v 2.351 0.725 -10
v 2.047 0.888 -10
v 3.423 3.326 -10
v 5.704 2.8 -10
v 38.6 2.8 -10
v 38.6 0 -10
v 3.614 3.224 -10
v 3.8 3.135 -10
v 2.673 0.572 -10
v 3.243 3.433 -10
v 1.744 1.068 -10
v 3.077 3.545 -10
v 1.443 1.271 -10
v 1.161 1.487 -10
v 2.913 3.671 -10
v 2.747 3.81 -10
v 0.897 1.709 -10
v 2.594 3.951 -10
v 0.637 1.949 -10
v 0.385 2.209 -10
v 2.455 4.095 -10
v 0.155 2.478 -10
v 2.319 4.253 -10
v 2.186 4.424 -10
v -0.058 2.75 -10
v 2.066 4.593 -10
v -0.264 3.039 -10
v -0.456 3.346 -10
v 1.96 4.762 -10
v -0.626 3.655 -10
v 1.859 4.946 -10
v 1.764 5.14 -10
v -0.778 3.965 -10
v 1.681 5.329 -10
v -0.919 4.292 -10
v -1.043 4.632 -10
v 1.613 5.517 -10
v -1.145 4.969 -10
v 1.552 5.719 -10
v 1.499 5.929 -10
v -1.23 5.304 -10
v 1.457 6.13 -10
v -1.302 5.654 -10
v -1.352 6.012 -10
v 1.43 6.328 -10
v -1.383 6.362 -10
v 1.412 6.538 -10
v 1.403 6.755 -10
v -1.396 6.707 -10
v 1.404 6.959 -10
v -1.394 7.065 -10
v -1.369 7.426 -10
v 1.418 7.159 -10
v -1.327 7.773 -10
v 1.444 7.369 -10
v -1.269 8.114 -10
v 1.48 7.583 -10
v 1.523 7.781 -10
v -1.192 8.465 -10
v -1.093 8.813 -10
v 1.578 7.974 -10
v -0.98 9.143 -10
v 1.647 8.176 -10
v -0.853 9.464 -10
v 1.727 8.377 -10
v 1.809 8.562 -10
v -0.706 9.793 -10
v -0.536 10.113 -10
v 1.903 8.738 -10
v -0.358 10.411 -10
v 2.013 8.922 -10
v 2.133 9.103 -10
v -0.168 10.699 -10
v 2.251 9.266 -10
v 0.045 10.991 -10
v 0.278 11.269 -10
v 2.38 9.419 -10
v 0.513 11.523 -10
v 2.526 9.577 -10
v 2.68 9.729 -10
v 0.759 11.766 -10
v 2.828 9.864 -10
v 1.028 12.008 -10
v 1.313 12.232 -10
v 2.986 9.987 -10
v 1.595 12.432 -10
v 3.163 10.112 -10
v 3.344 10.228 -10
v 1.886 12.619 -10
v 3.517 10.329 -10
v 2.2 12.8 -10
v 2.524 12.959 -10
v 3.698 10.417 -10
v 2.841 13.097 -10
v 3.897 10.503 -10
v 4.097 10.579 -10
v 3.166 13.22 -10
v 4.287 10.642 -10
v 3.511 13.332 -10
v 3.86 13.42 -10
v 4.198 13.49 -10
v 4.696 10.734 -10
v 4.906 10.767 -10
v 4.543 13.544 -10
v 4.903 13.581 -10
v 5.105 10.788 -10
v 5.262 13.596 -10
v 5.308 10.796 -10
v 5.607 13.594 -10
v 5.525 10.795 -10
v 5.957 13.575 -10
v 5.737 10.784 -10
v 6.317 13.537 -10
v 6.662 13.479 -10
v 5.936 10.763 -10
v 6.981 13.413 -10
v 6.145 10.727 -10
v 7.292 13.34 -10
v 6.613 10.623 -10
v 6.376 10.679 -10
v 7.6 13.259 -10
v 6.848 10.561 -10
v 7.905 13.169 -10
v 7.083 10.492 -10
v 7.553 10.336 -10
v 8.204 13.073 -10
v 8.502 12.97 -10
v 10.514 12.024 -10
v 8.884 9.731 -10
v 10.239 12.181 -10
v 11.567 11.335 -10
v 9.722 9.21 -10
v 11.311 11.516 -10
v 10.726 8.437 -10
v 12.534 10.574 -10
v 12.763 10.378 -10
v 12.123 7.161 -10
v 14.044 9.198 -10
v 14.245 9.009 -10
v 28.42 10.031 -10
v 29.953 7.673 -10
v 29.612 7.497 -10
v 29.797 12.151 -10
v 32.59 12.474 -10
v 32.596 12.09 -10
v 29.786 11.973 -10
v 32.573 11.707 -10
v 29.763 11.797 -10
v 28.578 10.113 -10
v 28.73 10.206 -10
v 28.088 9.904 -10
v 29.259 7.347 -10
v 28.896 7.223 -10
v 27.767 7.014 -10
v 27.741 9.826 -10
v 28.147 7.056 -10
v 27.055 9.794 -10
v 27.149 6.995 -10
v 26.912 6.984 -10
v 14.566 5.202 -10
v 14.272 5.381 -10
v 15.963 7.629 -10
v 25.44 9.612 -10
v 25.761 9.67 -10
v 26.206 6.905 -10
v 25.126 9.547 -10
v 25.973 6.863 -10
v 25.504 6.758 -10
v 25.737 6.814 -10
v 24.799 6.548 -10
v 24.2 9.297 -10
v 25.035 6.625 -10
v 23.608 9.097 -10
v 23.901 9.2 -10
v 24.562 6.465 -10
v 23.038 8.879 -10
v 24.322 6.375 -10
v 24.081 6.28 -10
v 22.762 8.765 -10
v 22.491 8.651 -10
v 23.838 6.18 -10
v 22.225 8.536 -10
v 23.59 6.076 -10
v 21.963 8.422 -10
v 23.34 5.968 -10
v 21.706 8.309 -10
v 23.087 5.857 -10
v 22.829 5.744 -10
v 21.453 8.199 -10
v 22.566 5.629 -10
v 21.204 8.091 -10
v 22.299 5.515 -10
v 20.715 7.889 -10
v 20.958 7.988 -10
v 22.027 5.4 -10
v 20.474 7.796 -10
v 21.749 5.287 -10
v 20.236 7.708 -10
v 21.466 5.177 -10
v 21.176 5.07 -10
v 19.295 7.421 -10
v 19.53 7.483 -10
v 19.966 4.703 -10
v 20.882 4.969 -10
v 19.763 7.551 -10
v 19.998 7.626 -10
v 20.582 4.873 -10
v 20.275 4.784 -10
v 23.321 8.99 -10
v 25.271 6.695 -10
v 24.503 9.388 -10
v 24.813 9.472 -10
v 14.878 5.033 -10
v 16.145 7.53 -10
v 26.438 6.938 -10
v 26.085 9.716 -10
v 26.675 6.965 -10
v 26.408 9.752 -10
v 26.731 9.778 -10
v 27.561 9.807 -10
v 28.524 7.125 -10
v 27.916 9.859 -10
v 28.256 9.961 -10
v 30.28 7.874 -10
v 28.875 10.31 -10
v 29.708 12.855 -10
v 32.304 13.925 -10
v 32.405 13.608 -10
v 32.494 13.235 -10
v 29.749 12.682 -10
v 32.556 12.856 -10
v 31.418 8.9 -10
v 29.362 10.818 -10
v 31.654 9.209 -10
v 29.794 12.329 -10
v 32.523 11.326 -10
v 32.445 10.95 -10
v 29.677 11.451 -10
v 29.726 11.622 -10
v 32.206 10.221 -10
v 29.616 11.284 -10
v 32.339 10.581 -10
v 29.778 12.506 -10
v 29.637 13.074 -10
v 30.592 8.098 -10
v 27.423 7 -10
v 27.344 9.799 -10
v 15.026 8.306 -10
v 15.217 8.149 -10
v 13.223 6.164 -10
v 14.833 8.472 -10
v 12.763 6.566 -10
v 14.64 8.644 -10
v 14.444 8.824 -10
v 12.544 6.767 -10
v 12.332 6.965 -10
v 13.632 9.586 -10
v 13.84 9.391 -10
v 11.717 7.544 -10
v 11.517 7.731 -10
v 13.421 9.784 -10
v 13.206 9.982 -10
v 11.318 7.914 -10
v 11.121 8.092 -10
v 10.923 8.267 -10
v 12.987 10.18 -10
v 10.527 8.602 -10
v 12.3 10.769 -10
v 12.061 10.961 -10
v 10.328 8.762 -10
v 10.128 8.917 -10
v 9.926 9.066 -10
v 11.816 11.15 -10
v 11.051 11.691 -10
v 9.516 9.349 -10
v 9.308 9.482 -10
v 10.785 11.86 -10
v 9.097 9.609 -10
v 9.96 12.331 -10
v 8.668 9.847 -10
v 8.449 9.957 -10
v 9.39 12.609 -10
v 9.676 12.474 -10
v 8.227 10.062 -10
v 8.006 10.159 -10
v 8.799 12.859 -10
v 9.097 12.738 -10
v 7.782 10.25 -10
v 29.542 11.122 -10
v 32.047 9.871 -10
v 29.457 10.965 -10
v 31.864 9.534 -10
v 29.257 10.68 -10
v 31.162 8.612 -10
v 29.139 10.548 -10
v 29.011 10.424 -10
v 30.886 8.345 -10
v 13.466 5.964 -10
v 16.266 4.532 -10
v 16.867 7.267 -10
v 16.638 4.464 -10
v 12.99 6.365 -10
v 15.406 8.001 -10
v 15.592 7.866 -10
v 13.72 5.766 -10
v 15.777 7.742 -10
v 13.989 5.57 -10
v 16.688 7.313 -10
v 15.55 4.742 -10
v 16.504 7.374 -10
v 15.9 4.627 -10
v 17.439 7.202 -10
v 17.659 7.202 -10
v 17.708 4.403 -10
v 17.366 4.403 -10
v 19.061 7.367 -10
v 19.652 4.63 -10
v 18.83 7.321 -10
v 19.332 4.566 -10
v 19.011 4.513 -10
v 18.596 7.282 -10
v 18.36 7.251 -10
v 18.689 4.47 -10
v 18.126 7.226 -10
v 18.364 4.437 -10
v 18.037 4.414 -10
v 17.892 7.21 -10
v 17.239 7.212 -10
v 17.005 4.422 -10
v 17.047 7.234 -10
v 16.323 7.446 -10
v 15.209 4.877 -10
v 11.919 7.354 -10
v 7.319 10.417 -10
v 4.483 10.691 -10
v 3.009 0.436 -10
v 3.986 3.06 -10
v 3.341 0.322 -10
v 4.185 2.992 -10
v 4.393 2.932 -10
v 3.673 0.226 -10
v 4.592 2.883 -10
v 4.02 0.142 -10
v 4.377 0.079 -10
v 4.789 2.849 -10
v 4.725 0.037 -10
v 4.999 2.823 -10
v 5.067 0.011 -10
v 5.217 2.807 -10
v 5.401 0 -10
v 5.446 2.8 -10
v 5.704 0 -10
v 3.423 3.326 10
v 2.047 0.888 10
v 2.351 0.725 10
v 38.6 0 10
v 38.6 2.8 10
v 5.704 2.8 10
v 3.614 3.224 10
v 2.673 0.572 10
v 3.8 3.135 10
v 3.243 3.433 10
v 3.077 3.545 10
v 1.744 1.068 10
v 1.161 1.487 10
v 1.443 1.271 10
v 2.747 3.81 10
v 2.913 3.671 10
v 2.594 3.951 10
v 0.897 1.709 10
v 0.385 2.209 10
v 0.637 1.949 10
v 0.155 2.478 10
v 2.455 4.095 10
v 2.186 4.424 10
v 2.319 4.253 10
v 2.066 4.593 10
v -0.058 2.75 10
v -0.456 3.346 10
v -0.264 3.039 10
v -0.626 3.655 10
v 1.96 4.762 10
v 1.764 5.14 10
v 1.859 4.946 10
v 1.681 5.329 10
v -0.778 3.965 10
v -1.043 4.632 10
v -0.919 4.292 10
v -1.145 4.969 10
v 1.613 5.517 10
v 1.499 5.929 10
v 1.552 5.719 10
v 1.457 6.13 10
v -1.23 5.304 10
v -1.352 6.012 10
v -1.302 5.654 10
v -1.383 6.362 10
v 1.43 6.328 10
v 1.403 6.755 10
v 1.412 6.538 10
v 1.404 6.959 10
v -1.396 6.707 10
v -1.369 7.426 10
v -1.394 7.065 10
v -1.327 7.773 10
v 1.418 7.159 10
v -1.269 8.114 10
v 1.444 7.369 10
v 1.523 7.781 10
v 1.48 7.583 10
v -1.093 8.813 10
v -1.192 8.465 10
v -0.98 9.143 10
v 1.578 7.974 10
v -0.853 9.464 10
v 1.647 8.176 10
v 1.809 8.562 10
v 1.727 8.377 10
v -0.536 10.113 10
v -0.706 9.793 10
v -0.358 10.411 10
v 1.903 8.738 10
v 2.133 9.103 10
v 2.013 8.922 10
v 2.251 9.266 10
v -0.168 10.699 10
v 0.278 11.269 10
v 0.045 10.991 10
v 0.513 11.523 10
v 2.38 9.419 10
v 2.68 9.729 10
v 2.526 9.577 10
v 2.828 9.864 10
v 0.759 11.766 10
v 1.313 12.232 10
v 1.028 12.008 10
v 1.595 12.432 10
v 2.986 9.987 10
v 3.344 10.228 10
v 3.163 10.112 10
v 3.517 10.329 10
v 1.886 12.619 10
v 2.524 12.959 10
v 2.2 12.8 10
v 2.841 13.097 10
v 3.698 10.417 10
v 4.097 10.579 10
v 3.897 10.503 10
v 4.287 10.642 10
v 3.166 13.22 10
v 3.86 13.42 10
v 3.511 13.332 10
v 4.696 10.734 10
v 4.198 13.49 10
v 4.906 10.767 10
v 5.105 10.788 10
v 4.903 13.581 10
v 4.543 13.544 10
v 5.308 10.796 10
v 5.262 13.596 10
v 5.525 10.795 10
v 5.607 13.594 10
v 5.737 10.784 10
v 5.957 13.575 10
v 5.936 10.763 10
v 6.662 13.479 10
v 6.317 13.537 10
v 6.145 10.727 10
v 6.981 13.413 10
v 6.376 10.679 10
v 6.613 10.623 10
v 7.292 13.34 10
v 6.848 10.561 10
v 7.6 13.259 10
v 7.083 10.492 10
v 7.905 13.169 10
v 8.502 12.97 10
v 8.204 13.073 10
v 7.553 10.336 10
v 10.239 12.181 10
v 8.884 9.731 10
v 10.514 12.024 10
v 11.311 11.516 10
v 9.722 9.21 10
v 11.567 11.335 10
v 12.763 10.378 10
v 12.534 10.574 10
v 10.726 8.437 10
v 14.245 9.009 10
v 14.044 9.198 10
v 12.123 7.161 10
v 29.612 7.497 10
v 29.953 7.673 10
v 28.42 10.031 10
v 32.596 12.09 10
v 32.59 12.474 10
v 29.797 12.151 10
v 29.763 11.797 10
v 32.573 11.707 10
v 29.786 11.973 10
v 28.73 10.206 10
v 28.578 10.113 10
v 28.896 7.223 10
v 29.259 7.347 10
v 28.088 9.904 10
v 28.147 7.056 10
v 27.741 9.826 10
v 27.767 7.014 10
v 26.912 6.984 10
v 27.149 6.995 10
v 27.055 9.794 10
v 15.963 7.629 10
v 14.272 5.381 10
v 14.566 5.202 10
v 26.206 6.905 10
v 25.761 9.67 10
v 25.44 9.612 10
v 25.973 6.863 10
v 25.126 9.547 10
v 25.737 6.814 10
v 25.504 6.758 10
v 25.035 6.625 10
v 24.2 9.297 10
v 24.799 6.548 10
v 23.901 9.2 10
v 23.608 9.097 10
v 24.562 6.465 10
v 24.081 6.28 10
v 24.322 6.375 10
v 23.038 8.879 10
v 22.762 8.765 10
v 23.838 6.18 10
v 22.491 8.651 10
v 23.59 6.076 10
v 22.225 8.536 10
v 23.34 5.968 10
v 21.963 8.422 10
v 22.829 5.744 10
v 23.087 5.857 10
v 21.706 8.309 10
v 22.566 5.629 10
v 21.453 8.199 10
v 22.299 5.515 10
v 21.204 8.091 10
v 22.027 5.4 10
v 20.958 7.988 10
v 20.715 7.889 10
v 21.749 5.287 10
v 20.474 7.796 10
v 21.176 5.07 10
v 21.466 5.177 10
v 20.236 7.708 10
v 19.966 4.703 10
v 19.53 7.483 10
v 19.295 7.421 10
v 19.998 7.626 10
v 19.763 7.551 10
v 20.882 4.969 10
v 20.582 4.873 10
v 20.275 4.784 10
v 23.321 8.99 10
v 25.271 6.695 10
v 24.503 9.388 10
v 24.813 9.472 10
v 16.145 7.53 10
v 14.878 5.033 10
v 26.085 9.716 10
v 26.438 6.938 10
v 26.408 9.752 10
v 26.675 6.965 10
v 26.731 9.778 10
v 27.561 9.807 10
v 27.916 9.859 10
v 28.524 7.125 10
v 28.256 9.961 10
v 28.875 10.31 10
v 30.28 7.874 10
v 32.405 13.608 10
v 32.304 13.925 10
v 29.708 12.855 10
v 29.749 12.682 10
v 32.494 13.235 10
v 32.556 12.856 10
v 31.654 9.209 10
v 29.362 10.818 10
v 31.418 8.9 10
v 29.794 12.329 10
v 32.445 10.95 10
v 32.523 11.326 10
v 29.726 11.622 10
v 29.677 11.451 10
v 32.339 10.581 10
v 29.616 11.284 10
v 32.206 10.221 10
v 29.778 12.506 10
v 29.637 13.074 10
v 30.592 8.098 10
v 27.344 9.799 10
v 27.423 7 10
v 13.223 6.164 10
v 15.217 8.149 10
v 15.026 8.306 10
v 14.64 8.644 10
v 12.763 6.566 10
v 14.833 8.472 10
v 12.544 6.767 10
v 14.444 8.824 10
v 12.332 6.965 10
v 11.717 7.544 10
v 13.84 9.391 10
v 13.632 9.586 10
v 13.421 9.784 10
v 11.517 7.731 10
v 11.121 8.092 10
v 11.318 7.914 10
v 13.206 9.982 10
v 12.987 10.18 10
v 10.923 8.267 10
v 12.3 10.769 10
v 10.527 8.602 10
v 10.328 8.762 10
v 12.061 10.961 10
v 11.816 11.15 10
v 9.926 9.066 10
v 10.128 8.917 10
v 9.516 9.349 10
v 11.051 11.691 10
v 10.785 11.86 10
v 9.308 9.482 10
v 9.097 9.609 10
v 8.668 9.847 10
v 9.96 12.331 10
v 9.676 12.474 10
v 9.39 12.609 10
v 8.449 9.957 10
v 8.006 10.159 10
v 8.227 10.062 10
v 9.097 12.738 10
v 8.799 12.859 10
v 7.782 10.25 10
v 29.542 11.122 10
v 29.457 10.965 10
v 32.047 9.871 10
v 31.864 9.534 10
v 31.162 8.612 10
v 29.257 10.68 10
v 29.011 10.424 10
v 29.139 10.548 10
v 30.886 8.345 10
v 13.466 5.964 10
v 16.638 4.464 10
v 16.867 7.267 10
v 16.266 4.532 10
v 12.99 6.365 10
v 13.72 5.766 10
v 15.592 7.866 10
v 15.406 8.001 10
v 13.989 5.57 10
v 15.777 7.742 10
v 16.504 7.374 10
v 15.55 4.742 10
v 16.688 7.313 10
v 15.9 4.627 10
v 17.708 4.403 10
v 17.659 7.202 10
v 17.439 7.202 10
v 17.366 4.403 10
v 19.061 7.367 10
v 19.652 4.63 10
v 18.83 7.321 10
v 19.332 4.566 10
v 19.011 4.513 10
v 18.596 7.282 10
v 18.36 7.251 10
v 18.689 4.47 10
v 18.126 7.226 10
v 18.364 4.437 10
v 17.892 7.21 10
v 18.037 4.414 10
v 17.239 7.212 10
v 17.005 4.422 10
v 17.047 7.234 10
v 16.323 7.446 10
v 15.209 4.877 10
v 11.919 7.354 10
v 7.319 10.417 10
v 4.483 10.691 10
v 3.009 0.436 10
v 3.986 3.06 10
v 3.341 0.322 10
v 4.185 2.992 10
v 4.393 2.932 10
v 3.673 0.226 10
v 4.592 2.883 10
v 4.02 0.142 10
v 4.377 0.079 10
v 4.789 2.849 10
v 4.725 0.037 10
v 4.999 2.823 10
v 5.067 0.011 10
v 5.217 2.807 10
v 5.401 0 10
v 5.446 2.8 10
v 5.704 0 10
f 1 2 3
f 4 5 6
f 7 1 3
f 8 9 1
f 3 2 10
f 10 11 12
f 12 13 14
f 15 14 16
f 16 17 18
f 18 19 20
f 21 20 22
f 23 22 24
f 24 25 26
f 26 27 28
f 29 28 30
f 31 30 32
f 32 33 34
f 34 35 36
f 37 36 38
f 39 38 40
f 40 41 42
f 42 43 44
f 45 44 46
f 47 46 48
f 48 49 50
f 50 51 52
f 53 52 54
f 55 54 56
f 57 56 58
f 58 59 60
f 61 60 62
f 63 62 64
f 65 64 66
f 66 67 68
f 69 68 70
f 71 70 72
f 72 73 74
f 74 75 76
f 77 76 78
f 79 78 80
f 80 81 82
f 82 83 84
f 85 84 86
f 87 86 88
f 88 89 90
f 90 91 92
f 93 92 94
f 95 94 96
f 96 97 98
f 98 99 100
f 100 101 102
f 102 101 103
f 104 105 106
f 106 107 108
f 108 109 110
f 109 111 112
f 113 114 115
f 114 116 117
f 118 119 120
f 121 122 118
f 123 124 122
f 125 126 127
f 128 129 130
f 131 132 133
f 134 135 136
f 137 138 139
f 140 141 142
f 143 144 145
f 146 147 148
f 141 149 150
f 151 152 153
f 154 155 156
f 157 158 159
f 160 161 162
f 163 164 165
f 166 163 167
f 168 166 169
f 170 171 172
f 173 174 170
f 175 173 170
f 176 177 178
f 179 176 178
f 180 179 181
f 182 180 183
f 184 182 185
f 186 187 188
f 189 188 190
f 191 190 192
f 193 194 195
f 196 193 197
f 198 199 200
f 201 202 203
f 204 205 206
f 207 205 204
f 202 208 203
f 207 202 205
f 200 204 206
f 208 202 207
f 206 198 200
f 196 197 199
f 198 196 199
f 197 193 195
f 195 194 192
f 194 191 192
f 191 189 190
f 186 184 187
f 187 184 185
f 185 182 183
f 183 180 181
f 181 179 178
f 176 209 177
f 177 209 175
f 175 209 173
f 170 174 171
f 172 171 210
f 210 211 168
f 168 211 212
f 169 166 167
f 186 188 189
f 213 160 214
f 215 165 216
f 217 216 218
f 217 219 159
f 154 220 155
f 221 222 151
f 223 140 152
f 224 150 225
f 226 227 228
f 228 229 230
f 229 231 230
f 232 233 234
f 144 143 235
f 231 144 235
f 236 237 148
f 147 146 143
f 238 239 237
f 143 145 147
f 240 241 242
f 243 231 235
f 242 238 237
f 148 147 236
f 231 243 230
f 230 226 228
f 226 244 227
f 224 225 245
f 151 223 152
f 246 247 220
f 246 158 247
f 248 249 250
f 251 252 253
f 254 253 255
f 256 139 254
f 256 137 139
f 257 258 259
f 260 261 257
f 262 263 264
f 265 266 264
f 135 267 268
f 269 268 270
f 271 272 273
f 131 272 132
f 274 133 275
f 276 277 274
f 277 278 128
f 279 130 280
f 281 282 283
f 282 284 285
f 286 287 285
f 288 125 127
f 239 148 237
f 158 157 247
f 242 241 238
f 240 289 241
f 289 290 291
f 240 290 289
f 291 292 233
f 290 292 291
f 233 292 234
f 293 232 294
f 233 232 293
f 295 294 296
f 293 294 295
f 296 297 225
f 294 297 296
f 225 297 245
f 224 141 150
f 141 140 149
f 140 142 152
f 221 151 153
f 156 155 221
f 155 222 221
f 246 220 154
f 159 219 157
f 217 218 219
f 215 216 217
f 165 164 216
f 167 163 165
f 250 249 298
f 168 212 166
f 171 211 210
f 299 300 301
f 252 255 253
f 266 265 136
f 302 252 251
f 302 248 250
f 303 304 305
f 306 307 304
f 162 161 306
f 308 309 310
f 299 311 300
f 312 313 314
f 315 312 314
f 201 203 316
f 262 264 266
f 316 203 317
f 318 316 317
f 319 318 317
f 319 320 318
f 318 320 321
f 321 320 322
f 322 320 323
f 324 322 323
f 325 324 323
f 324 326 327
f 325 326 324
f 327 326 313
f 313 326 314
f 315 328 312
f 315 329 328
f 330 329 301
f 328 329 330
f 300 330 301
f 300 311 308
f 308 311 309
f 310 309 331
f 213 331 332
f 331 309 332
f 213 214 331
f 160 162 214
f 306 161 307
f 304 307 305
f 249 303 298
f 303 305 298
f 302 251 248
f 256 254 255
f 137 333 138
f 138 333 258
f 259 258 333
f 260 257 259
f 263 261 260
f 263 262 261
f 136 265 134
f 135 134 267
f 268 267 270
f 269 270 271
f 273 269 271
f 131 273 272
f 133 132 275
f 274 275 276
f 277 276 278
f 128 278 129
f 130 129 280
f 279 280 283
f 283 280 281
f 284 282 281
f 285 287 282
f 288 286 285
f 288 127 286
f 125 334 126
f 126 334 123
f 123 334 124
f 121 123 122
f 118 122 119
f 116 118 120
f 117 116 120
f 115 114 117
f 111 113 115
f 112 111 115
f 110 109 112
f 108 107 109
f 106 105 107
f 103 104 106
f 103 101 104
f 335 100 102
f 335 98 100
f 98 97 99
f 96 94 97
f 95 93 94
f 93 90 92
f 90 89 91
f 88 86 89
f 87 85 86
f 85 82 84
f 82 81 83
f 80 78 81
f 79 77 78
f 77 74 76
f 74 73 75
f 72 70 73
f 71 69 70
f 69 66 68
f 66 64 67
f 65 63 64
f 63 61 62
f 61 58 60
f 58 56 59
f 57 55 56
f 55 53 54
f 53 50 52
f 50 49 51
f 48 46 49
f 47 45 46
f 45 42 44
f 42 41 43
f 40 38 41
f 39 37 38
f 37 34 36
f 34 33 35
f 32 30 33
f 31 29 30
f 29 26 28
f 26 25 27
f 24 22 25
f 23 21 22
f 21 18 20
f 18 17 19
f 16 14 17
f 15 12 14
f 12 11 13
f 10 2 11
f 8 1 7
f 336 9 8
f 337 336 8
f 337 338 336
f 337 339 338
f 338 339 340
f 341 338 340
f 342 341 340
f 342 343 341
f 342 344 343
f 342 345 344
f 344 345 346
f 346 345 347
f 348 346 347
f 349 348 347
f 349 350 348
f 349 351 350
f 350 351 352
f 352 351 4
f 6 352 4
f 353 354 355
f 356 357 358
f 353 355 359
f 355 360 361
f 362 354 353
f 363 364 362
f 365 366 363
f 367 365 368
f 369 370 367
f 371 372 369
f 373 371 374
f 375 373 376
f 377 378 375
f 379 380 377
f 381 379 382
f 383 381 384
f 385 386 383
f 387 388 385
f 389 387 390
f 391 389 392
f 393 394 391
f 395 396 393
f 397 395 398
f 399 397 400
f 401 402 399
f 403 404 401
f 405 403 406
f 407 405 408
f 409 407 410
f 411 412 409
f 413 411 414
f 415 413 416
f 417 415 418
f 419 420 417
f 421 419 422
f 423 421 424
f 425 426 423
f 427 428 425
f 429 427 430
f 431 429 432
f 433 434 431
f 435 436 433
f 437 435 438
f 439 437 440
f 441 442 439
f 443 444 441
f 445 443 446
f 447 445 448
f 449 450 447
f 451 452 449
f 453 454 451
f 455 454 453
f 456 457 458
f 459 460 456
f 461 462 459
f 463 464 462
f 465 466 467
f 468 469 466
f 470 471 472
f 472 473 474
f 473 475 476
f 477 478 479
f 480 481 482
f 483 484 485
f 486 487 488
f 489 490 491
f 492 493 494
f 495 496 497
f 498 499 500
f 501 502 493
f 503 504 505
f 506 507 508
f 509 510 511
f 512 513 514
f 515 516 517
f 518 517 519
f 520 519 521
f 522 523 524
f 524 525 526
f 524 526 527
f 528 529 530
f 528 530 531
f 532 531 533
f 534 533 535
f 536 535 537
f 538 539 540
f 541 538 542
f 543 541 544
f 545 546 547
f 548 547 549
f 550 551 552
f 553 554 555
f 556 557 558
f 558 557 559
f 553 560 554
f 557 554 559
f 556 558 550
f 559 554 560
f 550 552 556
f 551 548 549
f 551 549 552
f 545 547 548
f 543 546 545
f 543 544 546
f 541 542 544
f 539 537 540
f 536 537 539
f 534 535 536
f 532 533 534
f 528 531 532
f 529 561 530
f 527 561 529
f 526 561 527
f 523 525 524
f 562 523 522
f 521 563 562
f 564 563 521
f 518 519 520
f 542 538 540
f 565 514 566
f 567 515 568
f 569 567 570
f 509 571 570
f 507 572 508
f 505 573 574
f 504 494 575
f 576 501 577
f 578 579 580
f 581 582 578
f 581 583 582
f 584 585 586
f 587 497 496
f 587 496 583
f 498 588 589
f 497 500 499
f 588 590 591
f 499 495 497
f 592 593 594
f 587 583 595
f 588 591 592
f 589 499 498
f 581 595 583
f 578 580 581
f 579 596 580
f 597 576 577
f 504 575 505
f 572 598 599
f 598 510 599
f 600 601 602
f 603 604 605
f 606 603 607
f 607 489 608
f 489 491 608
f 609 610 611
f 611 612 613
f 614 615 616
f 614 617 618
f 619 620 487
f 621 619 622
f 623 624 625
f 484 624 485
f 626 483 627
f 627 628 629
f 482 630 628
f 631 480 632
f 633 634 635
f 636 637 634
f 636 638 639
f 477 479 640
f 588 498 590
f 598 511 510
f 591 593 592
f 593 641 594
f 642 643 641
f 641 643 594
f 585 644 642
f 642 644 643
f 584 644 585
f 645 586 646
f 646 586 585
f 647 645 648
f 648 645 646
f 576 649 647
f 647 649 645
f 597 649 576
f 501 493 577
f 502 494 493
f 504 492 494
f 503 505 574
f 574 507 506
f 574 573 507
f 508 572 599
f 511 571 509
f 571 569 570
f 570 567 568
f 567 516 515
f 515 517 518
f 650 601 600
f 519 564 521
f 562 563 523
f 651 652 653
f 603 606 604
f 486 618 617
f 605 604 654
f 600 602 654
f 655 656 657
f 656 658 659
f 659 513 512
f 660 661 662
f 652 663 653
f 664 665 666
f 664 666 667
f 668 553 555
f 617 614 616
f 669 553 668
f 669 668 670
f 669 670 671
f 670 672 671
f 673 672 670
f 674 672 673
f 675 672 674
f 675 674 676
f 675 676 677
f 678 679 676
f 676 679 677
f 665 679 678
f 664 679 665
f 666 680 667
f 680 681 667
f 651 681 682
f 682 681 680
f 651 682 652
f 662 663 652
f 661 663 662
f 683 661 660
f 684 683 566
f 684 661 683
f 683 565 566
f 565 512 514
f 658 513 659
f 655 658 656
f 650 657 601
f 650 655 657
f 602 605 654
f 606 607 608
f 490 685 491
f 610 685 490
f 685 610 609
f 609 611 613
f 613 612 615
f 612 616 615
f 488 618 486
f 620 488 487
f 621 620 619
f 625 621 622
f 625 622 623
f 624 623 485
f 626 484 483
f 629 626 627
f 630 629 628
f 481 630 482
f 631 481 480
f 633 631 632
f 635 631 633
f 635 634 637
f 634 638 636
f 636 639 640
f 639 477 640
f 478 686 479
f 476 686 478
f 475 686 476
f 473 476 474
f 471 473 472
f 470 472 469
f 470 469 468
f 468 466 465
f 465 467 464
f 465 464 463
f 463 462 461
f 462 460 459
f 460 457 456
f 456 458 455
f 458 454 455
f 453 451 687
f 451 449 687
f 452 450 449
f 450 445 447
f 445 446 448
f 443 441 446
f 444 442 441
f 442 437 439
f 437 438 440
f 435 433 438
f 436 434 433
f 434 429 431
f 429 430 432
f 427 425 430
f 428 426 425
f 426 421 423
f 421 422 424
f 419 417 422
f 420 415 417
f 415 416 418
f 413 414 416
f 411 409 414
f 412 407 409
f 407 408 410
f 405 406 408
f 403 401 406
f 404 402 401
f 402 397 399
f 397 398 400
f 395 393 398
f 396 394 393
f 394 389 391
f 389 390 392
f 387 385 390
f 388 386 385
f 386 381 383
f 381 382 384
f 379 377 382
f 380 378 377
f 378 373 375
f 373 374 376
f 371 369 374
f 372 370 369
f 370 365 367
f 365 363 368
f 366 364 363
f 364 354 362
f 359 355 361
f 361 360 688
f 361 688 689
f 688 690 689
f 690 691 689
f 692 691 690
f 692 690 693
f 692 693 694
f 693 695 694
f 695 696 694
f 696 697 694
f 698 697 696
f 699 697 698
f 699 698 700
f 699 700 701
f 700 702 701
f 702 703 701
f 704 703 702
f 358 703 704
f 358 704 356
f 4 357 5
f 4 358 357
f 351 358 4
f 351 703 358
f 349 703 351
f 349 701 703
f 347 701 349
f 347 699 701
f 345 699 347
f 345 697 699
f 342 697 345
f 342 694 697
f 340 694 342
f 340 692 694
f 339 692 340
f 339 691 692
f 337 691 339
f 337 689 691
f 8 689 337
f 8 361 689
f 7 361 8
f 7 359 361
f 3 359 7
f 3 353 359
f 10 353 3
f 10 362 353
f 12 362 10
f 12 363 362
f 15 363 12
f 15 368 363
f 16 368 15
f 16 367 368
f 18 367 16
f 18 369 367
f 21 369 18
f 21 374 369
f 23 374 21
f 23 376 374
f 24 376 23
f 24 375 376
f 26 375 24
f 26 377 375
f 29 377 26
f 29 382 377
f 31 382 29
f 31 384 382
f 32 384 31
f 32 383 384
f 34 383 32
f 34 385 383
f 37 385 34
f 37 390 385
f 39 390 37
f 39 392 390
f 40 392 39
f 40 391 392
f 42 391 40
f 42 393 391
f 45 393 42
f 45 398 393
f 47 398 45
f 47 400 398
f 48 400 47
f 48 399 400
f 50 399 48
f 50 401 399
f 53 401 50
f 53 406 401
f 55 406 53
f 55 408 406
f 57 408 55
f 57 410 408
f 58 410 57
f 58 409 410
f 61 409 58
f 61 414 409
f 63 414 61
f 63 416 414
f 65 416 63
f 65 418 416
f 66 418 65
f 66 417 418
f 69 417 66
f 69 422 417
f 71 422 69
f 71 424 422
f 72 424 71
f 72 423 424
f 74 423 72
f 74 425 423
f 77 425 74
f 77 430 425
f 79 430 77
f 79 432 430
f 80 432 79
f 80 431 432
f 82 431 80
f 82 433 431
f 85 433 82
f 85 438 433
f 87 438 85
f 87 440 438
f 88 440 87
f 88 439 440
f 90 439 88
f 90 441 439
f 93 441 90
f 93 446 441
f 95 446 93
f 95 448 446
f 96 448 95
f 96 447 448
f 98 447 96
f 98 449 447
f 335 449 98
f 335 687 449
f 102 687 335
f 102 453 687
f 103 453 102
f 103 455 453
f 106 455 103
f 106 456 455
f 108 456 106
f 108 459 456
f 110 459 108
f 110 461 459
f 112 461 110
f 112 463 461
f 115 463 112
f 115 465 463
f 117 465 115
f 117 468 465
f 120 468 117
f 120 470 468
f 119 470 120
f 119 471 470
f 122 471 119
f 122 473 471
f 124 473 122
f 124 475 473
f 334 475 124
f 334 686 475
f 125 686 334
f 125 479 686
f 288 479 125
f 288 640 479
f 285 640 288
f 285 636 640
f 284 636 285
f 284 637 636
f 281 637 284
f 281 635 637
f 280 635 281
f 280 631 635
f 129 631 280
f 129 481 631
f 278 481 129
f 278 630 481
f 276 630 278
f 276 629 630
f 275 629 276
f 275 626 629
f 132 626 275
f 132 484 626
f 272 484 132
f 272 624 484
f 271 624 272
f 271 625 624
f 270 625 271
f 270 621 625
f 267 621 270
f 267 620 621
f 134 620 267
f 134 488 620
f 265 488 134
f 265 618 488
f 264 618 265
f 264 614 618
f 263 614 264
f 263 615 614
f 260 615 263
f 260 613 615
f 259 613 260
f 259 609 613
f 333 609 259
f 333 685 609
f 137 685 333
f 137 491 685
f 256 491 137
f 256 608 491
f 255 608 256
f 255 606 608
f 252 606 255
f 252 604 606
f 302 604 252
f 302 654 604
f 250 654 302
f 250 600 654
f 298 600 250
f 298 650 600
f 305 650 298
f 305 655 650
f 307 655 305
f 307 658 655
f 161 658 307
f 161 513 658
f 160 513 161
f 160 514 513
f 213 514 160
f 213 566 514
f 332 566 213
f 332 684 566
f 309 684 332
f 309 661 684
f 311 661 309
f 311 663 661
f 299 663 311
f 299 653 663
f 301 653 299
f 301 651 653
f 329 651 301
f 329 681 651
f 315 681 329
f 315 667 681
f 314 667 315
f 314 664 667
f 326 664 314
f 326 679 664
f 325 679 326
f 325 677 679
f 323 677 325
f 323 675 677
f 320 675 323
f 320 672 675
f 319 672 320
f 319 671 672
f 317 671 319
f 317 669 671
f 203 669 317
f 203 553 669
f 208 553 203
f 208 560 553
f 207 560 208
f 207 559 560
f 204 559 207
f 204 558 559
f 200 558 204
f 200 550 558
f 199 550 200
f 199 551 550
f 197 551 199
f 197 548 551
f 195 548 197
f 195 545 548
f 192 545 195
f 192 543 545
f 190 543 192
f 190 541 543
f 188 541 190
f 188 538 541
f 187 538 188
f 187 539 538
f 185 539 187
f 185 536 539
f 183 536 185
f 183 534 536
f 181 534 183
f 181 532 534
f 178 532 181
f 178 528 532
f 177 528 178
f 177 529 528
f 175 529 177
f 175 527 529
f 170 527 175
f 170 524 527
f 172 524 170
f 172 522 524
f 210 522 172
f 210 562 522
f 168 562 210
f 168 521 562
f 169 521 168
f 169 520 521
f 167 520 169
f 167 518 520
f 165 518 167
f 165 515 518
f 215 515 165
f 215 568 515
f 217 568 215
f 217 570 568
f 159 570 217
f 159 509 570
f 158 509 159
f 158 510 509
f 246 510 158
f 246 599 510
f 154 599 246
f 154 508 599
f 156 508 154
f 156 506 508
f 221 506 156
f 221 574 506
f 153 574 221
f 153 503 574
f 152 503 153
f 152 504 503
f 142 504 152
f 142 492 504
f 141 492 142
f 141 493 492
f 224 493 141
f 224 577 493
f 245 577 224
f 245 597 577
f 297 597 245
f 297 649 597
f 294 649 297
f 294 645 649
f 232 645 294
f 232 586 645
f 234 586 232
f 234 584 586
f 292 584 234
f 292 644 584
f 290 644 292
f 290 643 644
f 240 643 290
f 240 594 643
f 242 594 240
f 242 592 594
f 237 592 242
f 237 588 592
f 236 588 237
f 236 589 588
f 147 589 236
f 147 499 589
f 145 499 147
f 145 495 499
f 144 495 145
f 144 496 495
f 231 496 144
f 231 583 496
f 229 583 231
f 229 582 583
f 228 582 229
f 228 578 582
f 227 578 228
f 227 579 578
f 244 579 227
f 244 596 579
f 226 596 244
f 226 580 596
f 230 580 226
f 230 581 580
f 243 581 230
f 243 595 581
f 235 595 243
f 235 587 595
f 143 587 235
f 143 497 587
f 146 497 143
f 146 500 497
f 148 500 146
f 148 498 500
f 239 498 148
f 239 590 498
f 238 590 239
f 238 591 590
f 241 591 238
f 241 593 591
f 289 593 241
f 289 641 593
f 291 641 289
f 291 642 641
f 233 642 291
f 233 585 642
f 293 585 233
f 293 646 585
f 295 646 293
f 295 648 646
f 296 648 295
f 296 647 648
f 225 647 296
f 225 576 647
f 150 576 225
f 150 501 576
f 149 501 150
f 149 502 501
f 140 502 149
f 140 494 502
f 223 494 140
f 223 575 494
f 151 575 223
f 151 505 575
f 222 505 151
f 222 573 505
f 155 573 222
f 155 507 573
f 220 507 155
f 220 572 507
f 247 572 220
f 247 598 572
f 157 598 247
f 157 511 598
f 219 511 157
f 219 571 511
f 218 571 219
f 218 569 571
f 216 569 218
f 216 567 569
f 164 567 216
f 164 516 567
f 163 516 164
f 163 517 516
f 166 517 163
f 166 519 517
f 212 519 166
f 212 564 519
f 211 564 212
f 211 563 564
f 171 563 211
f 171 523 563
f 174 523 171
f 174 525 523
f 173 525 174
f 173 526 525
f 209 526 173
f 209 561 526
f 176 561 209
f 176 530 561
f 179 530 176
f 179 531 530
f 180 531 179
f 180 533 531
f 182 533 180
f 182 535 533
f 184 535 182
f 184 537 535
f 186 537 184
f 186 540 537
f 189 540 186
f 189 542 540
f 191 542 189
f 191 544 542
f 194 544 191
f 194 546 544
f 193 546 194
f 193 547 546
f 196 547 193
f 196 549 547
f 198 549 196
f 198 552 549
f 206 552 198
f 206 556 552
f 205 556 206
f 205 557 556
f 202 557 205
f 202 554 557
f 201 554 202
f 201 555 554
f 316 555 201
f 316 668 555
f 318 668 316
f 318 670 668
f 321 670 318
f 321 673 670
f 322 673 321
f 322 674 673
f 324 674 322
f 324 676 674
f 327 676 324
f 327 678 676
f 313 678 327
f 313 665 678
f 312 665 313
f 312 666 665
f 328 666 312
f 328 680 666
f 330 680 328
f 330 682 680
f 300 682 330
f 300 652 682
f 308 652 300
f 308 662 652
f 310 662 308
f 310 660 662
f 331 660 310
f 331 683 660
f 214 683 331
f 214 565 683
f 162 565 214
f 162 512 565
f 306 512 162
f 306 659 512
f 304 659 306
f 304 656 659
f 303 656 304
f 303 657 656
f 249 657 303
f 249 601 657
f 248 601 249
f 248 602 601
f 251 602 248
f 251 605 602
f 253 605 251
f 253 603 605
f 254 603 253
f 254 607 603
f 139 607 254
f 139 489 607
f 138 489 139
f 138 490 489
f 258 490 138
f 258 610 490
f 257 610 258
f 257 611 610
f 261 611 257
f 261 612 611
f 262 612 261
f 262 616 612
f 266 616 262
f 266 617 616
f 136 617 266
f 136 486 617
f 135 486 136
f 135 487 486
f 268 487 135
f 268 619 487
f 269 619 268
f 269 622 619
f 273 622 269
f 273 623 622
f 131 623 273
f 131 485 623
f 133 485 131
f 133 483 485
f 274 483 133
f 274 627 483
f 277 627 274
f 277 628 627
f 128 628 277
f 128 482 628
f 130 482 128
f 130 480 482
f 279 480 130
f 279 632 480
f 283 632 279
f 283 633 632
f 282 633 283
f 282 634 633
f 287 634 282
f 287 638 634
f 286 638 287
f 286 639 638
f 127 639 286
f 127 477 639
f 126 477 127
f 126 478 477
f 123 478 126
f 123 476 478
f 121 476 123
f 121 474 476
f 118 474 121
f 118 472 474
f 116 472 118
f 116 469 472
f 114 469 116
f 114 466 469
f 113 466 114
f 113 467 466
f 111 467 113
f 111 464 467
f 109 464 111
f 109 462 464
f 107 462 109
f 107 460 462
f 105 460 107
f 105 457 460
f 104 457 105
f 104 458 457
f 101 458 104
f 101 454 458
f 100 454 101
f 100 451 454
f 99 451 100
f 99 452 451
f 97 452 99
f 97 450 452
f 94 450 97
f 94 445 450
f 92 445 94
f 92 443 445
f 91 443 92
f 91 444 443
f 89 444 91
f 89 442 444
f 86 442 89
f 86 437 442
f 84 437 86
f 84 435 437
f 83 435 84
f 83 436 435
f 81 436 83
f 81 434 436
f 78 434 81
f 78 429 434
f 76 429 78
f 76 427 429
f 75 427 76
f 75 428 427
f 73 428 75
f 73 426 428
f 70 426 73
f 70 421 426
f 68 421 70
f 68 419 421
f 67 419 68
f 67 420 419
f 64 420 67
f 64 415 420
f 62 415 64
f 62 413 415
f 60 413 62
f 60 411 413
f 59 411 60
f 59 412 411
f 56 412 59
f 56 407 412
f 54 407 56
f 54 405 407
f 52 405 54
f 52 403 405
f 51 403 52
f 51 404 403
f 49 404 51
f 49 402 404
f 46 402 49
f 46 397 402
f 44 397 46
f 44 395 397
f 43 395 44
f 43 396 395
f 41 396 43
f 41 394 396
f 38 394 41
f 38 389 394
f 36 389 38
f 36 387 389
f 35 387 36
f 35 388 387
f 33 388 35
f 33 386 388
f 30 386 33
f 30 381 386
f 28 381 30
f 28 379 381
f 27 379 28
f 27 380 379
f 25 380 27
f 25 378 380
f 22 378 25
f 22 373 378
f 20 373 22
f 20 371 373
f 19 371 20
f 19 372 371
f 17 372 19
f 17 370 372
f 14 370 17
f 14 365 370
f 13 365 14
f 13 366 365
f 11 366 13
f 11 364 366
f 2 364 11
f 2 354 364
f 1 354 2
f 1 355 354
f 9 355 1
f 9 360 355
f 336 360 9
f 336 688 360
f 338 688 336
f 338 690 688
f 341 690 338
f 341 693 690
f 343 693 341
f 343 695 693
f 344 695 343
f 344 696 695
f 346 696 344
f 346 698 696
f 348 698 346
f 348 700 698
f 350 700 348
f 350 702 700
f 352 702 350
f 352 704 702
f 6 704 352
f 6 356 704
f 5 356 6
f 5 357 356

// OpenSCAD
// Auto-generated from generate.py — postit-wall-clip
// Edit generate.py (or the numbers below) and re-run to rebuild the STL.

width = 20.000;
thickness = 2.800; // ribbon thickness, baked into the polygon
$fn = 48;

module clip_profile() {
  polygon([
    [38.6000, 0.0000],
    [38.3188, 0.0000],
    [38.0377, 0.0000],
    [37.7565, 0.0000],
    [37.4754, 0.0000],
    [37.1942, 0.0000],
    [36.9131, 0.0000],
    [36.6319, 0.0000],
    [36.3507, 0.0000],
    [36.0696, 0.0000],
    [35.7884, 0.0000],
    [35.5073, 0.0000],
    [35.2261, 0.0000],
    [34.9449, 0.0000],
    [34.6638, 0.0000],
    [34.3826, 0.0000],
    [34.1015, 0.0000],
    [33.8203, 0.0000],
    [33.5392, 0.0000],
    [33.2580, 0.0000],
    [32.9768, 0.0000],
    [32.6957, 0.0000],
    [32.4145, 0.0000],
    [32.1334, 0.0000],
    [31.8522, 0.0000],
    [31.5710, 0.0000],
    [31.2899, 0.0000],
    [31.0087, 0.0000],
    [30.7276, 0.0000],
    [30.4464, 0.0000],
    [30.1653, 0.0000],
    [29.8841, 0.0000],
    [29.6029, 0.0000],
    [29.3218, 0.0000],
    [29.0406, 0.0000],
    [28.7595, 0.0000],
    [28.4783, 0.0000],
    [28.1971, 0.0000],
    [27.9160, 0.0000],
    [27.6348, 0.0000],
    [27.3537, 0.0000],
    [27.0725, 0.0000],
    [26.7914, 0.0000],
    [26.5102, 0.0000],
    [26.2290, 0.0000],
    [25.9479, 0.0000],
    [25.6667, 0.0000],
    [25.3856, 0.0000],
    [25.1044, 0.0000],
    [24.8232, 0.0000],
    [24.5421, 0.0000],
    [24.2609, 0.0000],
    [23.9798, 0.0000],
    [23.6986, 0.0000],
    [23.4175, 0.0000],
    [23.1363, 0.0000],
    [22.8551, 0.0000],
    [22.5740, 0.0000],
    [22.2928, 0.0000],
    [22.0117, 0.0000],
    [21.7305, 0.0000],
    [21.4493, 0.0000],
    [21.1682, 0.0000],
    [20.8870, 0.0000],
    [20.6059, 0.0000],
    [20.3247, 0.0000],
    [20.0436, 0.0000],
    [19.7624, 0.0000],
    [19.4812, 0.0000],
    [19.2001, 0.0000],
    [18.9189, 0.0000],
    [18.6378, 0.0000],
    [18.3566, 0.0000],
    [18.0754, 0.0000],
    [17.7943, 0.0000],
    [17.5131, 0.0000],
    [17.2320, 0.0000],
    [16.9508, 0.0000],
    [16.6697, 0.0000],
    [16.3885, 0.0000],
    [16.1073, 0.0000],
    [15.8262, 0.0000],
    [15.5450, 0.0000],
    [15.2639, 0.0000],
    [14.9827, 0.0000],
    [14.7015, 0.0000],
    [14.4204, 0.0000],
    [14.1392, 0.0000],
    [13.8581, 0.0000],
    [13.5769, 0.0000],
    [13.2958, 0.0000],
    [13.0146, 0.0000],
    [12.7334, 0.0000],
    [12.4523, 0.0000],
    [12.1711, 0.0000],
    [11.8900, 0.0000],
    [11.6088, 0.0000],
    [11.3277, 0.0000],
    [11.0465, 0.0000],
    [10.7653, 0.0000],
    [10.4842, 0.0000],
    [10.2030, 0.0000],
    [9.9219, 0.0000],
    [9.6407, 0.0000],
    [9.3595, 0.0000],
    [9.0784, 0.0000],
    [8.7972, 0.0000],
    [8.5161, 0.0000],
    [8.2349, 0.0000],
    [7.9538, 0.0000],
    [7.6726, 0.0000],
    [7.3914, 0.0000],
    [7.1103, 0.0000],
    [6.8291, 0.0000],
    [6.5480, 0.0000],
    [6.2668, 0.0000],
    [5.9856, 0.0000],
    [5.7045, 0.0000],
    [5.4009, 0.0002],
    [5.0673, 0.0110],
    [4.7249, 0.0368],
    [4.3769, 0.0793],
    [4.0202, 0.1424],
    [3.6730, 0.2260],
    [3.3414, 0.3225],
    [3.0086, 0.4363],
    [2.6728, 0.5721],
    [2.3514, 0.7250],
    [2.0467, 0.8879],
    [1.7437, 1.0685],
    [1.4435, 1.2711],
    [1.1614, 1.4866],
    [0.8970, 1.7088],
    [0.6370, 1.9488],
    [0.3854, 2.2094],
    [0.1546, 2.4776],
    [-0.0583, 2.7496],
    [-0.2637, 3.0390],
    [-0.4557, 3.3462],
    [-0.6256, 3.6554],
    [-0.7778, 3.9655],
    [-0.9194, 4.2920],
    [-1.0434, 4.6324],
    [-1.1455, 4.9690],
    [-1.2304, 5.3038],
    [-1.3017, 5.6536],
    [-1.3523, 6.0123],
    [-1.3826, 6.3616],
    [-1.3965, 6.7068],
    [-1.3941, 7.0649],
    [-1.3690, 7.4263],
    [-1.3267, 7.7733],
    [-1.2690, 8.1138],
    [-1.1925, 8.4648],
    [-1.0929, 8.8131],
    [-0.9802, 9.1428],
    [-0.8535, 9.4642],
    [-0.7056, 9.7927],
    [-0.5359, 10.1127],
    [-0.3580, 10.4112],
    [-0.1677, 10.6994],
    [0.0454, 10.9912],
    [0.2780, 11.2690],
    [0.5129, 11.5235],
    [0.7587, 11.7664],
    [1.0283, 12.0084],
    [1.3132, 12.2318],
    [1.5949, 12.4317],
    [1.8865, 12.6192],
    [2.2004, 12.8000],
    [2.5244, 12.9592],
    [2.8413, 13.0967],
    [3.1664, 13.2203],
    [3.5110, 13.3319],
    [3.8599, 13.4205],
    [4.1983, 13.4897],
    [4.5429, 13.5436],
    [4.9032, 13.5812],
    [5.2618, 13.5958],
    [5.6072, 13.5936],
    [5.9566, 13.5752],
    [6.3168, 13.5371],
    [6.6621, 13.4789],
    [6.9813, 13.4132],
    [7.2916, 13.3398],
    [7.6000, 13.2586],
    [7.9048, 13.1690],
    [8.2040, 13.0733],
    [8.5020, 12.9701],
    [8.7993, 12.8587],
    [9.0967, 12.7380],
    [9.3896, 12.6089],
    [9.6764, 12.4736],
    [9.9597, 12.3309],
    [10.2392, 12.1809],
    [10.5144, 12.0240],
    [10.7850, 11.8605],
    [11.0507, 11.6909],
    [11.3113, 11.5156],
    [11.5666, 11.3352],
    [11.8165, 11.1503],
    [12.0611, 10.9614],
    [12.3002, 10.7693],
    [12.5341, 10.5745],
    [12.7629, 10.3779],
    [12.9868, 10.1800],
    [13.2062, 9.9817],
    [13.4212, 9.7836],
    [13.6323, 9.5865],
    [13.8398, 9.3911],
    [14.0440, 9.1983],
    [14.2453, 9.0088],
    [14.4441, 8.8236],
    [14.6397, 8.6445],
    [14.8334, 8.4720],
    [15.0261, 8.3063],
    [15.2174, 8.1488],
    [15.4065, 8.0011],
    [15.5919, 7.8658],
    [15.7769, 7.7423],
    [15.9631, 7.6290],
    [16.1446, 7.5299],
    [16.3228, 7.4460],
    [16.5042, 7.3739],
    [16.6885, 7.3133],
    [16.8667, 7.2668],
    [17.0475, 7.2343],
    [17.2386, 7.2124],
    [17.4393, 7.2021],
    [17.6594, 7.2023],
    [17.8922, 7.2105],
    [18.1259, 7.2265],
    [18.3605, 7.2506],
    [18.5960, 7.2822],
    [18.8299, 7.3209],
    [19.0615, 7.3670],
    [19.2948, 7.4213],
    [19.5298, 7.4827],
    [19.7632, 7.5506],
    [19.9982, 7.6260],
    [20.2359, 7.7079],
    [20.4738, 7.7956],
    [20.7147, 7.8894],
    [20.9580, 7.9881],
    [21.2037, 8.0913],
    [21.4533, 8.1987],
    [21.7063, 8.3091],
    [21.9631, 8.4218],
    [22.2246, 8.5362],
    [22.4909, 8.6511],
    [22.7616, 8.7654],
    [23.0385, 8.8790],
    [23.3208, 8.9897],
    [23.6076, 9.0969],
    [23.9015, 9.2002],
    [24.2000, 9.2972],
    [24.5029, 9.3880],
    [24.8127, 9.4718],
    [25.1257, 9.5466],
    [25.4403, 9.6124],
    [25.7613, 9.6697],
    [26.0852, 9.7160],
    [26.4078, 9.7520],
    [26.7312, 9.7779],
    [27.0551, 9.7938],
    [27.3437, 9.7992],
    [27.5614, 9.8068],
    [27.7407, 9.8263],
    [27.9158, 9.8586],
    [28.0881, 9.9036],
    [28.2565, 9.9612],
    [28.4203, 10.0310],
    [28.5785, 10.1127],
    [28.7303, 10.2057],
    [28.8749, 10.3097],
    [29.0114, 10.4240],
    [29.1392, 10.5481],
    [29.2566, 10.6800],
    [29.3619, 10.8182],
    [29.4569, 10.9655],
    [29.5423, 11.1219],
    [29.6159, 11.2841],
    [29.6774, 11.4512],
    [29.7264, 11.6224],
    [29.7628, 11.7966],
    [29.7862, 11.9731],
    [29.7967, 12.1508],
    [29.7940, 12.3289],
    [29.7782, 12.5063],
    [29.7495, 12.6821],
    [29.7079, 12.8553],
    [29.6372, 13.0738],
    [32.3045, 13.9255],
    [32.4048, 13.6084],
    [32.4944, 13.2350],
    [32.5563, 12.8560],
    [32.5902, 12.4736],
    [32.5960, 12.0898],
    [32.5735, 11.7066],
    [32.5230, 11.3261],
    [32.4446, 10.9504],
    [32.3388, 10.5814],
    [32.2063, 10.2211],
    [32.0475, 9.8715],
    [31.8636, 9.5345],
    [31.6536, 9.2095],
    [31.4182, 8.9003],
    [31.1620, 8.6120],
    [30.8865, 8.3446],
    [30.5921, 8.0981],
    [30.2804, 7.8740],
    [29.9532, 7.6734],
    [29.6121, 7.4973],
    [29.2590, 7.3468],
    [28.8958, 7.2227],
    [28.5244, 7.1255],
    [28.1468, 7.0559],
    [27.7673, 7.0144],
    [27.4232, 7.0003],
    [27.1495, 6.9954],
    [26.9118, 6.9837],
    [26.6748, 6.9647],
    [26.4385, 6.9384],
    [26.2059, 6.9052],
    [25.9733, 6.8635],
    [25.7375, 6.8142],
    [25.5036, 6.7584],
    [25.2707, 6.6953],
    [25.0350, 6.6246],
    [24.7987, 6.5478],
    [24.5622, 6.4646],
    [24.3222, 6.3749],
    [24.0810, 6.2803],
    [23.8377, 6.1805],
    [23.5904, 6.0760],
    [23.3404, 5.9681],
    [23.0868, 5.8571],
    [22.8287, 5.7439],
    [22.5662, 5.6294],
    [22.2993, 5.5146],
    [22.0266, 5.4000],
    [21.7488, 5.2873],
    [21.4657, 5.1771],
    [21.1760, 5.0705],
    [20.8820, 4.9691],
    [20.5817, 4.8729],
    [20.2750, 4.7837],
    [19.9661, 4.7029],
    [19.6517, 4.6299],
    [19.3319, 4.5663],
    [19.0110, 4.5131],
    [18.6893, 4.4700],
    [18.3645, 4.4367],
    [18.0372, 4.4142],
    [17.7081, 4.4027],
    [17.3660, 4.4031],
    [17.0053, 4.4221],
    [16.6380, 4.4644],
    [16.2656, 4.5321],
    [15.8996, 4.6267],
    [15.5498, 4.7416],
    [15.2089, 4.8771],
    [14.8784, 5.0326],
    [14.5661, 5.2024],
    [14.2719, 5.3811],
    [13.9893, 5.5698],
    [13.7203, 5.7658],
    [13.4662, 5.9640],
    [13.2234, 6.1638],
    [12.9897, 6.3647],
    [12.7634, 6.5662],
    [12.5443, 6.7667],
    [12.3316, 6.9649],
    [12.1234, 7.1607],
    [11.9188, 7.3540],
    [11.7169, 7.5441],
    [11.5170, 7.7308],
    [11.3185, 7.9137],
    [11.1208, 8.0925],
    [10.9233, 8.2670],
    [10.7257, 8.4369],
    [10.5275, 8.6019],
    [10.3283, 8.7620],
    [10.1278, 8.9169],
    [9.9257, 9.0664],
    [9.7218, 9.2105],
    [9.5159, 9.3491],
    [9.3076, 9.4820],
    [9.0970, 9.6093],
    [8.8837, 9.7309],
    [8.6678, 9.8468],
    [8.4490, 9.9570],
    [8.2272, 10.0616],
    [8.0056, 10.1594],
    [7.7820, 10.2501],
    [7.5527, 10.3359],
    [7.3194, 10.4167],
    [7.0831, 10.4923],
    [6.8484, 10.5614],
    [6.6131, 10.6233],
    [6.3762, 10.6793],
    [6.1448, 10.7271],
    [5.9358, 10.7631],
    [5.7369, 10.7838],
    [5.5250, 10.7948],
    [5.3084, 10.7962],
    [5.1052, 10.7885],
    [4.9062, 10.7673],
    [4.6956, 10.7342],
    [4.4834, 10.6908],
    [4.2872, 10.6416],
    [4.0970, 10.5795],
    [3.8967, 10.5032],
    [3.6981, 10.4170],
    [3.5171, 10.3289],
    [3.3441, 10.2285],
    [3.1629, 10.1120],
    [2.9863, 9.9866],
    [2.8283, 9.8637],
    [2.6799, 9.7294],
    [2.5260, 9.5774],
    [2.3797, 9.4189],
    [2.2507, 9.2659],
    [2.1328, 9.1032],
    [2.0135, 8.9225],
    [1.9035, 8.7382],
    [1.8093, 8.5617],
    [1.7270, 8.3772],
    [1.6475, 8.1758],
    [1.5783, 7.9737],
    [1.5229, 7.7815],
    [1.4802, 7.5830],
    [1.4440, 7.3695],
    [1.4181, 7.1586],
    [1.4039, 6.9590],
    [1.4031, 6.7549],
    [1.4118, 6.5385],
    [1.4299, 6.3278],
    [1.4575, 6.1297],
    [1.4990, 5.9288],
    [1.5522, 5.7189],
    [1.6130, 5.5175],
    [1.6813, 5.3294],
    [1.7638, 5.1404],
    [1.8592, 4.9460],
    [1.9597, 4.7624],
    [2.0657, 4.5927],
    [2.1860, 4.4239],
    [2.3194, 4.2534],
    [2.4550, 4.0953],
    [2.5940, 3.9513],
    [2.7473, 3.8103],
    [2.9131, 3.6710],
    [3.0775, 3.5449],
    [3.2434, 3.4331],
    [3.4234, 3.3261],
    [3.6144, 3.2240],
    [3.8004, 3.1350],
    [3.9859, 3.0602],
    [4.1851, 2.9923],
    [4.3930, 2.9318],
    [4.5923, 2.8834],
    [4.7894, 2.8488],
    [4.9993, 2.8234],
    [5.2173, 2.8070],
    [5.4457, 2.7998],
    [5.7045, 2.8000],
    [5.9856, 2.8000],
    [6.2668, 2.8000],
    [6.5480, 2.8000],
    [6.8291, 2.8000],
    [7.1103, 2.8000],
    [7.3914, 2.8000],
    [7.6726, 2.8000],
    [7.9538, 2.8000],
    [8.2349, 2.8000],
    [8.5161, 2.8000],
    [8.7972, 2.8000],
    [9.0784, 2.8000],
    [9.3595, 2.8000],
    [9.6407, 2.8000],
    [9.9219, 2.8000],
    [10.2030, 2.8000],
    [10.4842, 2.8000],
    [10.7653, 2.8000],
    [11.0465, 2.8000],
    [11.3277, 2.8000],
    [11.6088, 2.8000],
    [11.8900, 2.8000],
    [12.1711, 2.8000],
    [12.4523, 2.8000],
    [12.7334, 2.8000],
    [13.0146, 2.8000],
    [13.2958, 2.8000],
    [13.5769, 2.8000],
    [13.8581, 2.8000],
    [14.1392, 2.8000],
    [14.4204, 2.8000],
    [14.7015, 2.8000],
    [14.9827, 2.8000],
    [15.2639, 2.8000],
    [15.5450, 2.8000],
    [15.8262, 2.8000],
    [16.1073, 2.8000],
    [16.3885, 2.8000],
    [16.6697, 2.8000],
    [16.9508, 2.8000],
    [17.2320, 2.8000],
    [17.5131, 2.8000],
    [17.7943, 2.8000],
    [18.0754, 2.8000],
    [18.3566, 2.8000],
    [18.6378, 2.8000],
    [18.9189, 2.8000],
    [19.2001, 2.8000],
    [19.4812, 2.8000],
    [19.7624, 2.8000],
    [20.0436, 2.8000],
    [20.3247, 2.8000],
    [20.6059, 2.8000],
    [20.8870, 2.8000],
    [21.1682, 2.8000],
    [21.4493, 2.8000],
    [21.7305, 2.8000],
    [22.0117, 2.8000],
    [22.2928, 2.8000],
    [22.5740, 2.8000],
    [22.8551, 2.8000],
    [23.1363, 2.8000],
    [23.4175, 2.8000],
    [23.6986, 2.8000],
    [23.9798, 2.8000],
    [24.2609, 2.8000],
    [24.5421, 2.8000],
    [24.8232, 2.8000],
    [25.1044, 2.8000],
    [25.3856, 2.8000],
    [25.6667, 2.8000],
    [25.9479, 2.8000],
    [26.2290, 2.8000],
    [26.5102, 2.8000],
    [26.7914, 2.8000],
    [27.0725, 2.8000],
    [27.3537, 2.8000],
    [27.6348, 2.8000],
    [27.9160, 2.8000],
    [28.1971, 2.8000],
    [28.4783, 2.8000],
    [28.7595, 2.8000],
    [29.0406, 2.8000],
    [29.3218, 2.8000],
    [29.6029, 2.8000],
    [29.8841, 2.8000],
    [30.1653, 2.8000],
    [30.4464, 2.8000],
    [30.7276, 2.8000],
    [31.0087, 2.8000],
    [31.2899, 2.8000],
    [31.5710, 2.8000],
    [31.8522, 2.8000],
    [32.1334, 2.8000],
    [32.4145, 2.8000],
    [32.6957, 2.8000],
    [32.9768, 2.8000],
    [33.2580, 2.8000],
    [33.5392, 2.8000],
    [33.8203, 2.8000],
    [34.1015, 2.8000],
    [34.3826, 2.8000],
    [34.6638, 2.8000],
    [34.9449, 2.8000],
    [35.2261, 2.8000],
    [35.5073, 2.8000],
    [35.7884, 2.8000],
    [36.0696, 2.8000],
    [36.3507, 2.8000],
    [36.6319, 2.8000],
    [36.9131, 2.8000],
    [37.1942, 2.8000],
    [37.4754, 2.8000],
    [37.7565, 2.8000],
    [38.0377, 2.8000],
    [38.3188, 2.8000],
    [38.6000, 2.8000]
  ]);
}

linear_extrude(height = width, center = true)
  clip_profile();
